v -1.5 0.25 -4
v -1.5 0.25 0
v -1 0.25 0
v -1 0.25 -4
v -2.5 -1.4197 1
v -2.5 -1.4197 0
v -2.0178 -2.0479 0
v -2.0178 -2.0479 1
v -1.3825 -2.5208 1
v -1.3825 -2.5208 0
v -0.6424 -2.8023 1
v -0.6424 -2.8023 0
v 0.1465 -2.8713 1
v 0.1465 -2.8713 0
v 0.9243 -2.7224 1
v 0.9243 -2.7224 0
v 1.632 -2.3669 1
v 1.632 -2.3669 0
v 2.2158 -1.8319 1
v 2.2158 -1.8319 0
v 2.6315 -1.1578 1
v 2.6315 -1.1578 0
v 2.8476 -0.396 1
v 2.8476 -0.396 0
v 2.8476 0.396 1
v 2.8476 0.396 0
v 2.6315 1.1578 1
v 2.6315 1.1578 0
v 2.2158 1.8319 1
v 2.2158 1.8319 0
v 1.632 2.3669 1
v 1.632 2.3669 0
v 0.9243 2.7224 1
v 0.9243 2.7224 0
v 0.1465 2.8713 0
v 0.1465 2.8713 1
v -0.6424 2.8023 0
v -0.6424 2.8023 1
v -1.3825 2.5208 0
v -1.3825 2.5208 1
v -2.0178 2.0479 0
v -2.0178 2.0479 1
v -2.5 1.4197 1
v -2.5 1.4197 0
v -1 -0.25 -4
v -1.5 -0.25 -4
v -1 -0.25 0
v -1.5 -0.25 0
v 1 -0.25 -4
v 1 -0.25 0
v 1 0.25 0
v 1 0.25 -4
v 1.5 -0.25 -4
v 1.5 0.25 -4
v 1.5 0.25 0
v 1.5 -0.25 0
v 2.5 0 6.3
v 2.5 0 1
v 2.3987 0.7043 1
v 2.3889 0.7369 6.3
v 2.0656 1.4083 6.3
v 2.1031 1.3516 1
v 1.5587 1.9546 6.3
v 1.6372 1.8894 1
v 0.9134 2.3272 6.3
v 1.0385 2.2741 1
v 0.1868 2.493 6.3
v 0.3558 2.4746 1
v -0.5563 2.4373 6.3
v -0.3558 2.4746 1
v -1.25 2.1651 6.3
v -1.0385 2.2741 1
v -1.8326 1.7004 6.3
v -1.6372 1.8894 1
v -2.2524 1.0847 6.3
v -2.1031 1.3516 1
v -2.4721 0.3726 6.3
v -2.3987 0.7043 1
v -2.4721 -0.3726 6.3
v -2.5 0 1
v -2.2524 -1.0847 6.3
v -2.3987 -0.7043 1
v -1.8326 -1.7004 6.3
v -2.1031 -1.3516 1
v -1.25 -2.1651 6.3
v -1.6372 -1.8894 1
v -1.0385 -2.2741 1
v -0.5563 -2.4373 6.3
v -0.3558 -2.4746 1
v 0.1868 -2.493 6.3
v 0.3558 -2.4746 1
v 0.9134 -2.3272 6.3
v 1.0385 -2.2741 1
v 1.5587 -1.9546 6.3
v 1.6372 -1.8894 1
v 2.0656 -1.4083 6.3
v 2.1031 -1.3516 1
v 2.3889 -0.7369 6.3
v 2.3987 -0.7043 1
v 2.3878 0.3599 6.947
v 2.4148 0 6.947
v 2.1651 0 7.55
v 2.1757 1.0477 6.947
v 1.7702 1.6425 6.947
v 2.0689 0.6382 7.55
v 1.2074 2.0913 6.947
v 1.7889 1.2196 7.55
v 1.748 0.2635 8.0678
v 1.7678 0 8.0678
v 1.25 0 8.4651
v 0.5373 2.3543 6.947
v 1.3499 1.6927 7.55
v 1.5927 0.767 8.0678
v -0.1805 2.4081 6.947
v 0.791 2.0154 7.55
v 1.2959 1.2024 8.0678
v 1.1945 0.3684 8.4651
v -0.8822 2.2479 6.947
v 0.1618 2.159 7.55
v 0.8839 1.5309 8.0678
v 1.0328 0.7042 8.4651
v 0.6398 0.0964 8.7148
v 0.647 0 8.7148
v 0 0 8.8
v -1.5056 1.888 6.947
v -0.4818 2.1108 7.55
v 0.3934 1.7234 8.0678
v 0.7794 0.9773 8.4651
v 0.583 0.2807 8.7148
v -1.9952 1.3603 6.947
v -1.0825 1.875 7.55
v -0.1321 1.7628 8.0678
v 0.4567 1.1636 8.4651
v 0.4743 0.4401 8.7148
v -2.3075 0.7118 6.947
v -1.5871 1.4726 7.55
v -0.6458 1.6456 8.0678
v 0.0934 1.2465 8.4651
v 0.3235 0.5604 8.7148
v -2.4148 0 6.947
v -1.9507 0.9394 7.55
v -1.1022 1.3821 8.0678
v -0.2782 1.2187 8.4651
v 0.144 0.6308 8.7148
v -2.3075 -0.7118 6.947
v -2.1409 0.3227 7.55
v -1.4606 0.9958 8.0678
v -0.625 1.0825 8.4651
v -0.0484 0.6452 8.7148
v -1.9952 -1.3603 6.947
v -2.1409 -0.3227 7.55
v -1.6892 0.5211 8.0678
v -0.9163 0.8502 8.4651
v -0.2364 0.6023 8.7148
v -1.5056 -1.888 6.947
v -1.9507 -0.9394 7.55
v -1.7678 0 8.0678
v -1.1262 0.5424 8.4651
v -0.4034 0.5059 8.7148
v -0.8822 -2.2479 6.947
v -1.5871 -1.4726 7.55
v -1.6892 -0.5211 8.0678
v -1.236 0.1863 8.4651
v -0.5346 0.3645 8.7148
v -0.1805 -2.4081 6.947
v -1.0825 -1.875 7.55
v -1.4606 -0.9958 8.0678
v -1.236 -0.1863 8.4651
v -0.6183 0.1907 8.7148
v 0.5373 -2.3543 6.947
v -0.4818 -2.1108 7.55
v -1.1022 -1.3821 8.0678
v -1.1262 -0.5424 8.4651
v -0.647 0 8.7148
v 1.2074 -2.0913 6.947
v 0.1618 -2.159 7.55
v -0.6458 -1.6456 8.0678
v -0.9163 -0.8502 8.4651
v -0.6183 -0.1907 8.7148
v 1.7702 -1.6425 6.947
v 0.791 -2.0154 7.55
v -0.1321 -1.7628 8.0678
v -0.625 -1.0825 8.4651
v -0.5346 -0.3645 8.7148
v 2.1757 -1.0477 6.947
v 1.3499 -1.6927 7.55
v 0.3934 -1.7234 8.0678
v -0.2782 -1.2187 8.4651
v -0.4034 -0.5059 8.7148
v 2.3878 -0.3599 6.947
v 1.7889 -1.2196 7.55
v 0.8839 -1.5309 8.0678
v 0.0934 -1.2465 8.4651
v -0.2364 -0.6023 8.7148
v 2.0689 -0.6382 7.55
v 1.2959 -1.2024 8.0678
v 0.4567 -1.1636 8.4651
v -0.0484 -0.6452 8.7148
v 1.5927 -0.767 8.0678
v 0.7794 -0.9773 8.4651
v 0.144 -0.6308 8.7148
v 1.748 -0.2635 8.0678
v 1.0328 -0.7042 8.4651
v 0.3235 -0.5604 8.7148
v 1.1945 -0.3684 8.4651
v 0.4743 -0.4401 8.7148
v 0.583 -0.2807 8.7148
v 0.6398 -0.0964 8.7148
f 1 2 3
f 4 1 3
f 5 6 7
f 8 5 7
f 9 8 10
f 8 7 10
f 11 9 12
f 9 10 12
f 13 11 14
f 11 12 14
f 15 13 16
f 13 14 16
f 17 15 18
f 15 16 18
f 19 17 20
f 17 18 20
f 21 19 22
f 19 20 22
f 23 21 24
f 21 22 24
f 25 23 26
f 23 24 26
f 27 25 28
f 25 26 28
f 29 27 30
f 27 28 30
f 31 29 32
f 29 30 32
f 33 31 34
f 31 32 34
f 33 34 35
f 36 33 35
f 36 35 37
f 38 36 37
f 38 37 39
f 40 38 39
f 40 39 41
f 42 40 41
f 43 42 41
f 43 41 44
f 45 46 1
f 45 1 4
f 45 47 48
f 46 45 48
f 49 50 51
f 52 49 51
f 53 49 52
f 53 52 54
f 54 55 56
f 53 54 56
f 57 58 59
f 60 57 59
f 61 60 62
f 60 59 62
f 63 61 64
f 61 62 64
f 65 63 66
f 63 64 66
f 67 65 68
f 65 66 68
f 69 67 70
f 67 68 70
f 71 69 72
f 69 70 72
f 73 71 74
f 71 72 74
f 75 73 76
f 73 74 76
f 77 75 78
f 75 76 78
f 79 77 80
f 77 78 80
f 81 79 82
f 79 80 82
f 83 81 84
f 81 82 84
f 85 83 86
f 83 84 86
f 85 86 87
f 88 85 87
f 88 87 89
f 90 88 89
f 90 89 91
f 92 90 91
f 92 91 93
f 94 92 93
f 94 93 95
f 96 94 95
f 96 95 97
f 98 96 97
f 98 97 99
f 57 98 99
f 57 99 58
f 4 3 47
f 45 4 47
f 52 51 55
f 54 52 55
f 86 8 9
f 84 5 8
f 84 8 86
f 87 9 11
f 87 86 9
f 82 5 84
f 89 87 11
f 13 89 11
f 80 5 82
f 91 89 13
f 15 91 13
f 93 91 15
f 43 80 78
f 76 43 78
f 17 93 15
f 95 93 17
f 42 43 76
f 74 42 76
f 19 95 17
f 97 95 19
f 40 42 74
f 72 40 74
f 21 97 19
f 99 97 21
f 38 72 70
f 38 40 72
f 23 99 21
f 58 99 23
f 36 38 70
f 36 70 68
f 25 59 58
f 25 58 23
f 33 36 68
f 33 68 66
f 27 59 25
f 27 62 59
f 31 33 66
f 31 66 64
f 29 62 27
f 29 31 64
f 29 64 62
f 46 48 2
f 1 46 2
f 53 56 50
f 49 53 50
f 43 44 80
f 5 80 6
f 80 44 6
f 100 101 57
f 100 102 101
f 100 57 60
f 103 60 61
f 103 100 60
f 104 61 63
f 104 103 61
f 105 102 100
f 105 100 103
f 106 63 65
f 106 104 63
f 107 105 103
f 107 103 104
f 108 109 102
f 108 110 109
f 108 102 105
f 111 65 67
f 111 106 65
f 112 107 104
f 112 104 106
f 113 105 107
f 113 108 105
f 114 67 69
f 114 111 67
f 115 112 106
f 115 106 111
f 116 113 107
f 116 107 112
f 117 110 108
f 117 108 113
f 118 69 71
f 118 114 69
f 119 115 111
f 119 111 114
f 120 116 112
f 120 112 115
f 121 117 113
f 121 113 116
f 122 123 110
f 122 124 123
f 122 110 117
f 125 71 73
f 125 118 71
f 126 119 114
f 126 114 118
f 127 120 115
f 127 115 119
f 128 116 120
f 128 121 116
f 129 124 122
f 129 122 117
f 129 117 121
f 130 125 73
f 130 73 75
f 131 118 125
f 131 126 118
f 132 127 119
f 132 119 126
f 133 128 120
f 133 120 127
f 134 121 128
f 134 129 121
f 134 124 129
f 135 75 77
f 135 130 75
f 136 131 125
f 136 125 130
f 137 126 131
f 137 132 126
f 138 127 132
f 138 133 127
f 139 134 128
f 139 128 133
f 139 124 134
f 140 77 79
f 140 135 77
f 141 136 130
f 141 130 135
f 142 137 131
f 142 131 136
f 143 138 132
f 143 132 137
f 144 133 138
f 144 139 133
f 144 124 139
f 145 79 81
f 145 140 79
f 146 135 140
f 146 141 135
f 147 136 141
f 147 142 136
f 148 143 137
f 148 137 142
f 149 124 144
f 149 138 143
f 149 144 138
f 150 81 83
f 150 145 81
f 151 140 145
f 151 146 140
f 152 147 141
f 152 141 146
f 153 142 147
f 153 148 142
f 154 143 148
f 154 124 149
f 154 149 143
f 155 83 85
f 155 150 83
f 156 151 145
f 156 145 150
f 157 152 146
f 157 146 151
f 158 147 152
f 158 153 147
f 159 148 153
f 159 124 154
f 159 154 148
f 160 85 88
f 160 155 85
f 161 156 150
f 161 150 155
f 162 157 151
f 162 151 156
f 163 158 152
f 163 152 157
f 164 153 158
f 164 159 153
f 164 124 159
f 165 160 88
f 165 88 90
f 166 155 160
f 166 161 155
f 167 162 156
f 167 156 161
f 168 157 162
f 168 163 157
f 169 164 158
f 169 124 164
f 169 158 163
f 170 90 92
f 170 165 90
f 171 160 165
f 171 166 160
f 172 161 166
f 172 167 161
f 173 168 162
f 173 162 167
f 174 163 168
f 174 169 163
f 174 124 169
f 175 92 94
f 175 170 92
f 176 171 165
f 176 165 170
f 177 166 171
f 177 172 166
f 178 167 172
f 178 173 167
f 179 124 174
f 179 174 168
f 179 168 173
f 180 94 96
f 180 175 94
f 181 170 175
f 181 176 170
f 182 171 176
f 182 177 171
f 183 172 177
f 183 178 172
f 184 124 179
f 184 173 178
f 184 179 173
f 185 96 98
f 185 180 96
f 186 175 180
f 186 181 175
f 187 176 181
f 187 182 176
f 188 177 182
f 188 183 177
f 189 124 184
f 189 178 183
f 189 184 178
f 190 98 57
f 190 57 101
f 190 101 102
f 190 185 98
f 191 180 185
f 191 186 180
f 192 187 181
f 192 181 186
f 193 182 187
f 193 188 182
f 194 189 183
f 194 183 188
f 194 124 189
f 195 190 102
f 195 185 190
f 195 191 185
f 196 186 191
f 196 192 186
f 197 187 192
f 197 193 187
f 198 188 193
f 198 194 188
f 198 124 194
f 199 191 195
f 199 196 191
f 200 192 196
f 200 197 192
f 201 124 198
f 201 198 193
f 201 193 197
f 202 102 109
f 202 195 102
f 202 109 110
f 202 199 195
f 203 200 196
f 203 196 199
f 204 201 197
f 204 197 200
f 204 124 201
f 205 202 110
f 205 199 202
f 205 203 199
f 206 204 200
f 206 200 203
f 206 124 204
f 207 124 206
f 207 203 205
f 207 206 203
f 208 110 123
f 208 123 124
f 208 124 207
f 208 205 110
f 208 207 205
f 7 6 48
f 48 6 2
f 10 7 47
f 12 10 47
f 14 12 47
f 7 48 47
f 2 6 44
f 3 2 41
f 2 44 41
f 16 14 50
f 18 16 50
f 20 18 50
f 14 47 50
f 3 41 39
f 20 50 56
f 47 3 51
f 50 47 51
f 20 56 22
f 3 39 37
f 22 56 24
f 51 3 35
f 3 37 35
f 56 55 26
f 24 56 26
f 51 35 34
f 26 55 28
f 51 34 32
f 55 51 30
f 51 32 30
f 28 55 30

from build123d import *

# Parameters (mm, degrees)
F1_DEPTH = 8.8
F2_DEPTH = 1
F3_R     = 2.5
F5_DEPTH = 4


with BuildPart() as f1:
    # F0 (on Top) → F1 (new body)
    with BuildSketch(Plane.XY):
        with BuildLine():
            ThreePointArc((-2.5, 0), (0, -2.5), (2.5, 0))
            ThreePointArc((2.5, 0), (0, 2.5), (-2.5, 0))
        make_face()
    extrude(amount=F1_DEPTH)

    # F0 (on Top) → F2 (join)
    with BuildSketch(Plane.XY):
        with BuildLine():
            Line((-2.5, 1.4197270865), (-2.5, 0))
            Line((-2.5, 0), (-2.5, -1.4197270865))
            ThreePointArc((-2.5, -1.4197270865), (2.875, 0), (-2.5, 1.4197270865))
        make_face()
        with BuildLine():
            ThreePointArc((-2.5, 0), (0, 2.5), (2.5, 0))
            ThreePointArc((2.5, 0), (0, -2.5), (-2.5, 0))
        make_face(mode=Mode.SUBTRACT)
        with BuildLine():
            ThreePointArc((-2.5, 0), (0, -2.5), (2.5, 0))
            ThreePointArc((2.5, 0), (0, 2.5), (-2.5, 0))
        make_face()
    extrude(amount=F2_DEPTH)

    # F3
    f3_edges = [f1.edges().sort_by_distance(p)[0] for p in [
        (-2.5, 0, 8.8),
    ]]
    fillet(f3_edges, radius=F3_R)

    # F4 (on face) → F5 (join)
    with BuildSketch(Plane(origin=(0, 0, 0), x_dir=(1, 0, 0), z_dir=(0, 0, -1))):
        Polygon((1, 0.25), (1, 0), (1, -0.25), (1.5, -0.25), (1.5, 0.25), align=None)
        Polygon((-1, 0.25), (-1.5, 0.25), (-1.5, -0.25), (-1, -0.25), (-1, 0), align=None)
    extrude(amount=F5_DEPTH)


solid = f1.part
